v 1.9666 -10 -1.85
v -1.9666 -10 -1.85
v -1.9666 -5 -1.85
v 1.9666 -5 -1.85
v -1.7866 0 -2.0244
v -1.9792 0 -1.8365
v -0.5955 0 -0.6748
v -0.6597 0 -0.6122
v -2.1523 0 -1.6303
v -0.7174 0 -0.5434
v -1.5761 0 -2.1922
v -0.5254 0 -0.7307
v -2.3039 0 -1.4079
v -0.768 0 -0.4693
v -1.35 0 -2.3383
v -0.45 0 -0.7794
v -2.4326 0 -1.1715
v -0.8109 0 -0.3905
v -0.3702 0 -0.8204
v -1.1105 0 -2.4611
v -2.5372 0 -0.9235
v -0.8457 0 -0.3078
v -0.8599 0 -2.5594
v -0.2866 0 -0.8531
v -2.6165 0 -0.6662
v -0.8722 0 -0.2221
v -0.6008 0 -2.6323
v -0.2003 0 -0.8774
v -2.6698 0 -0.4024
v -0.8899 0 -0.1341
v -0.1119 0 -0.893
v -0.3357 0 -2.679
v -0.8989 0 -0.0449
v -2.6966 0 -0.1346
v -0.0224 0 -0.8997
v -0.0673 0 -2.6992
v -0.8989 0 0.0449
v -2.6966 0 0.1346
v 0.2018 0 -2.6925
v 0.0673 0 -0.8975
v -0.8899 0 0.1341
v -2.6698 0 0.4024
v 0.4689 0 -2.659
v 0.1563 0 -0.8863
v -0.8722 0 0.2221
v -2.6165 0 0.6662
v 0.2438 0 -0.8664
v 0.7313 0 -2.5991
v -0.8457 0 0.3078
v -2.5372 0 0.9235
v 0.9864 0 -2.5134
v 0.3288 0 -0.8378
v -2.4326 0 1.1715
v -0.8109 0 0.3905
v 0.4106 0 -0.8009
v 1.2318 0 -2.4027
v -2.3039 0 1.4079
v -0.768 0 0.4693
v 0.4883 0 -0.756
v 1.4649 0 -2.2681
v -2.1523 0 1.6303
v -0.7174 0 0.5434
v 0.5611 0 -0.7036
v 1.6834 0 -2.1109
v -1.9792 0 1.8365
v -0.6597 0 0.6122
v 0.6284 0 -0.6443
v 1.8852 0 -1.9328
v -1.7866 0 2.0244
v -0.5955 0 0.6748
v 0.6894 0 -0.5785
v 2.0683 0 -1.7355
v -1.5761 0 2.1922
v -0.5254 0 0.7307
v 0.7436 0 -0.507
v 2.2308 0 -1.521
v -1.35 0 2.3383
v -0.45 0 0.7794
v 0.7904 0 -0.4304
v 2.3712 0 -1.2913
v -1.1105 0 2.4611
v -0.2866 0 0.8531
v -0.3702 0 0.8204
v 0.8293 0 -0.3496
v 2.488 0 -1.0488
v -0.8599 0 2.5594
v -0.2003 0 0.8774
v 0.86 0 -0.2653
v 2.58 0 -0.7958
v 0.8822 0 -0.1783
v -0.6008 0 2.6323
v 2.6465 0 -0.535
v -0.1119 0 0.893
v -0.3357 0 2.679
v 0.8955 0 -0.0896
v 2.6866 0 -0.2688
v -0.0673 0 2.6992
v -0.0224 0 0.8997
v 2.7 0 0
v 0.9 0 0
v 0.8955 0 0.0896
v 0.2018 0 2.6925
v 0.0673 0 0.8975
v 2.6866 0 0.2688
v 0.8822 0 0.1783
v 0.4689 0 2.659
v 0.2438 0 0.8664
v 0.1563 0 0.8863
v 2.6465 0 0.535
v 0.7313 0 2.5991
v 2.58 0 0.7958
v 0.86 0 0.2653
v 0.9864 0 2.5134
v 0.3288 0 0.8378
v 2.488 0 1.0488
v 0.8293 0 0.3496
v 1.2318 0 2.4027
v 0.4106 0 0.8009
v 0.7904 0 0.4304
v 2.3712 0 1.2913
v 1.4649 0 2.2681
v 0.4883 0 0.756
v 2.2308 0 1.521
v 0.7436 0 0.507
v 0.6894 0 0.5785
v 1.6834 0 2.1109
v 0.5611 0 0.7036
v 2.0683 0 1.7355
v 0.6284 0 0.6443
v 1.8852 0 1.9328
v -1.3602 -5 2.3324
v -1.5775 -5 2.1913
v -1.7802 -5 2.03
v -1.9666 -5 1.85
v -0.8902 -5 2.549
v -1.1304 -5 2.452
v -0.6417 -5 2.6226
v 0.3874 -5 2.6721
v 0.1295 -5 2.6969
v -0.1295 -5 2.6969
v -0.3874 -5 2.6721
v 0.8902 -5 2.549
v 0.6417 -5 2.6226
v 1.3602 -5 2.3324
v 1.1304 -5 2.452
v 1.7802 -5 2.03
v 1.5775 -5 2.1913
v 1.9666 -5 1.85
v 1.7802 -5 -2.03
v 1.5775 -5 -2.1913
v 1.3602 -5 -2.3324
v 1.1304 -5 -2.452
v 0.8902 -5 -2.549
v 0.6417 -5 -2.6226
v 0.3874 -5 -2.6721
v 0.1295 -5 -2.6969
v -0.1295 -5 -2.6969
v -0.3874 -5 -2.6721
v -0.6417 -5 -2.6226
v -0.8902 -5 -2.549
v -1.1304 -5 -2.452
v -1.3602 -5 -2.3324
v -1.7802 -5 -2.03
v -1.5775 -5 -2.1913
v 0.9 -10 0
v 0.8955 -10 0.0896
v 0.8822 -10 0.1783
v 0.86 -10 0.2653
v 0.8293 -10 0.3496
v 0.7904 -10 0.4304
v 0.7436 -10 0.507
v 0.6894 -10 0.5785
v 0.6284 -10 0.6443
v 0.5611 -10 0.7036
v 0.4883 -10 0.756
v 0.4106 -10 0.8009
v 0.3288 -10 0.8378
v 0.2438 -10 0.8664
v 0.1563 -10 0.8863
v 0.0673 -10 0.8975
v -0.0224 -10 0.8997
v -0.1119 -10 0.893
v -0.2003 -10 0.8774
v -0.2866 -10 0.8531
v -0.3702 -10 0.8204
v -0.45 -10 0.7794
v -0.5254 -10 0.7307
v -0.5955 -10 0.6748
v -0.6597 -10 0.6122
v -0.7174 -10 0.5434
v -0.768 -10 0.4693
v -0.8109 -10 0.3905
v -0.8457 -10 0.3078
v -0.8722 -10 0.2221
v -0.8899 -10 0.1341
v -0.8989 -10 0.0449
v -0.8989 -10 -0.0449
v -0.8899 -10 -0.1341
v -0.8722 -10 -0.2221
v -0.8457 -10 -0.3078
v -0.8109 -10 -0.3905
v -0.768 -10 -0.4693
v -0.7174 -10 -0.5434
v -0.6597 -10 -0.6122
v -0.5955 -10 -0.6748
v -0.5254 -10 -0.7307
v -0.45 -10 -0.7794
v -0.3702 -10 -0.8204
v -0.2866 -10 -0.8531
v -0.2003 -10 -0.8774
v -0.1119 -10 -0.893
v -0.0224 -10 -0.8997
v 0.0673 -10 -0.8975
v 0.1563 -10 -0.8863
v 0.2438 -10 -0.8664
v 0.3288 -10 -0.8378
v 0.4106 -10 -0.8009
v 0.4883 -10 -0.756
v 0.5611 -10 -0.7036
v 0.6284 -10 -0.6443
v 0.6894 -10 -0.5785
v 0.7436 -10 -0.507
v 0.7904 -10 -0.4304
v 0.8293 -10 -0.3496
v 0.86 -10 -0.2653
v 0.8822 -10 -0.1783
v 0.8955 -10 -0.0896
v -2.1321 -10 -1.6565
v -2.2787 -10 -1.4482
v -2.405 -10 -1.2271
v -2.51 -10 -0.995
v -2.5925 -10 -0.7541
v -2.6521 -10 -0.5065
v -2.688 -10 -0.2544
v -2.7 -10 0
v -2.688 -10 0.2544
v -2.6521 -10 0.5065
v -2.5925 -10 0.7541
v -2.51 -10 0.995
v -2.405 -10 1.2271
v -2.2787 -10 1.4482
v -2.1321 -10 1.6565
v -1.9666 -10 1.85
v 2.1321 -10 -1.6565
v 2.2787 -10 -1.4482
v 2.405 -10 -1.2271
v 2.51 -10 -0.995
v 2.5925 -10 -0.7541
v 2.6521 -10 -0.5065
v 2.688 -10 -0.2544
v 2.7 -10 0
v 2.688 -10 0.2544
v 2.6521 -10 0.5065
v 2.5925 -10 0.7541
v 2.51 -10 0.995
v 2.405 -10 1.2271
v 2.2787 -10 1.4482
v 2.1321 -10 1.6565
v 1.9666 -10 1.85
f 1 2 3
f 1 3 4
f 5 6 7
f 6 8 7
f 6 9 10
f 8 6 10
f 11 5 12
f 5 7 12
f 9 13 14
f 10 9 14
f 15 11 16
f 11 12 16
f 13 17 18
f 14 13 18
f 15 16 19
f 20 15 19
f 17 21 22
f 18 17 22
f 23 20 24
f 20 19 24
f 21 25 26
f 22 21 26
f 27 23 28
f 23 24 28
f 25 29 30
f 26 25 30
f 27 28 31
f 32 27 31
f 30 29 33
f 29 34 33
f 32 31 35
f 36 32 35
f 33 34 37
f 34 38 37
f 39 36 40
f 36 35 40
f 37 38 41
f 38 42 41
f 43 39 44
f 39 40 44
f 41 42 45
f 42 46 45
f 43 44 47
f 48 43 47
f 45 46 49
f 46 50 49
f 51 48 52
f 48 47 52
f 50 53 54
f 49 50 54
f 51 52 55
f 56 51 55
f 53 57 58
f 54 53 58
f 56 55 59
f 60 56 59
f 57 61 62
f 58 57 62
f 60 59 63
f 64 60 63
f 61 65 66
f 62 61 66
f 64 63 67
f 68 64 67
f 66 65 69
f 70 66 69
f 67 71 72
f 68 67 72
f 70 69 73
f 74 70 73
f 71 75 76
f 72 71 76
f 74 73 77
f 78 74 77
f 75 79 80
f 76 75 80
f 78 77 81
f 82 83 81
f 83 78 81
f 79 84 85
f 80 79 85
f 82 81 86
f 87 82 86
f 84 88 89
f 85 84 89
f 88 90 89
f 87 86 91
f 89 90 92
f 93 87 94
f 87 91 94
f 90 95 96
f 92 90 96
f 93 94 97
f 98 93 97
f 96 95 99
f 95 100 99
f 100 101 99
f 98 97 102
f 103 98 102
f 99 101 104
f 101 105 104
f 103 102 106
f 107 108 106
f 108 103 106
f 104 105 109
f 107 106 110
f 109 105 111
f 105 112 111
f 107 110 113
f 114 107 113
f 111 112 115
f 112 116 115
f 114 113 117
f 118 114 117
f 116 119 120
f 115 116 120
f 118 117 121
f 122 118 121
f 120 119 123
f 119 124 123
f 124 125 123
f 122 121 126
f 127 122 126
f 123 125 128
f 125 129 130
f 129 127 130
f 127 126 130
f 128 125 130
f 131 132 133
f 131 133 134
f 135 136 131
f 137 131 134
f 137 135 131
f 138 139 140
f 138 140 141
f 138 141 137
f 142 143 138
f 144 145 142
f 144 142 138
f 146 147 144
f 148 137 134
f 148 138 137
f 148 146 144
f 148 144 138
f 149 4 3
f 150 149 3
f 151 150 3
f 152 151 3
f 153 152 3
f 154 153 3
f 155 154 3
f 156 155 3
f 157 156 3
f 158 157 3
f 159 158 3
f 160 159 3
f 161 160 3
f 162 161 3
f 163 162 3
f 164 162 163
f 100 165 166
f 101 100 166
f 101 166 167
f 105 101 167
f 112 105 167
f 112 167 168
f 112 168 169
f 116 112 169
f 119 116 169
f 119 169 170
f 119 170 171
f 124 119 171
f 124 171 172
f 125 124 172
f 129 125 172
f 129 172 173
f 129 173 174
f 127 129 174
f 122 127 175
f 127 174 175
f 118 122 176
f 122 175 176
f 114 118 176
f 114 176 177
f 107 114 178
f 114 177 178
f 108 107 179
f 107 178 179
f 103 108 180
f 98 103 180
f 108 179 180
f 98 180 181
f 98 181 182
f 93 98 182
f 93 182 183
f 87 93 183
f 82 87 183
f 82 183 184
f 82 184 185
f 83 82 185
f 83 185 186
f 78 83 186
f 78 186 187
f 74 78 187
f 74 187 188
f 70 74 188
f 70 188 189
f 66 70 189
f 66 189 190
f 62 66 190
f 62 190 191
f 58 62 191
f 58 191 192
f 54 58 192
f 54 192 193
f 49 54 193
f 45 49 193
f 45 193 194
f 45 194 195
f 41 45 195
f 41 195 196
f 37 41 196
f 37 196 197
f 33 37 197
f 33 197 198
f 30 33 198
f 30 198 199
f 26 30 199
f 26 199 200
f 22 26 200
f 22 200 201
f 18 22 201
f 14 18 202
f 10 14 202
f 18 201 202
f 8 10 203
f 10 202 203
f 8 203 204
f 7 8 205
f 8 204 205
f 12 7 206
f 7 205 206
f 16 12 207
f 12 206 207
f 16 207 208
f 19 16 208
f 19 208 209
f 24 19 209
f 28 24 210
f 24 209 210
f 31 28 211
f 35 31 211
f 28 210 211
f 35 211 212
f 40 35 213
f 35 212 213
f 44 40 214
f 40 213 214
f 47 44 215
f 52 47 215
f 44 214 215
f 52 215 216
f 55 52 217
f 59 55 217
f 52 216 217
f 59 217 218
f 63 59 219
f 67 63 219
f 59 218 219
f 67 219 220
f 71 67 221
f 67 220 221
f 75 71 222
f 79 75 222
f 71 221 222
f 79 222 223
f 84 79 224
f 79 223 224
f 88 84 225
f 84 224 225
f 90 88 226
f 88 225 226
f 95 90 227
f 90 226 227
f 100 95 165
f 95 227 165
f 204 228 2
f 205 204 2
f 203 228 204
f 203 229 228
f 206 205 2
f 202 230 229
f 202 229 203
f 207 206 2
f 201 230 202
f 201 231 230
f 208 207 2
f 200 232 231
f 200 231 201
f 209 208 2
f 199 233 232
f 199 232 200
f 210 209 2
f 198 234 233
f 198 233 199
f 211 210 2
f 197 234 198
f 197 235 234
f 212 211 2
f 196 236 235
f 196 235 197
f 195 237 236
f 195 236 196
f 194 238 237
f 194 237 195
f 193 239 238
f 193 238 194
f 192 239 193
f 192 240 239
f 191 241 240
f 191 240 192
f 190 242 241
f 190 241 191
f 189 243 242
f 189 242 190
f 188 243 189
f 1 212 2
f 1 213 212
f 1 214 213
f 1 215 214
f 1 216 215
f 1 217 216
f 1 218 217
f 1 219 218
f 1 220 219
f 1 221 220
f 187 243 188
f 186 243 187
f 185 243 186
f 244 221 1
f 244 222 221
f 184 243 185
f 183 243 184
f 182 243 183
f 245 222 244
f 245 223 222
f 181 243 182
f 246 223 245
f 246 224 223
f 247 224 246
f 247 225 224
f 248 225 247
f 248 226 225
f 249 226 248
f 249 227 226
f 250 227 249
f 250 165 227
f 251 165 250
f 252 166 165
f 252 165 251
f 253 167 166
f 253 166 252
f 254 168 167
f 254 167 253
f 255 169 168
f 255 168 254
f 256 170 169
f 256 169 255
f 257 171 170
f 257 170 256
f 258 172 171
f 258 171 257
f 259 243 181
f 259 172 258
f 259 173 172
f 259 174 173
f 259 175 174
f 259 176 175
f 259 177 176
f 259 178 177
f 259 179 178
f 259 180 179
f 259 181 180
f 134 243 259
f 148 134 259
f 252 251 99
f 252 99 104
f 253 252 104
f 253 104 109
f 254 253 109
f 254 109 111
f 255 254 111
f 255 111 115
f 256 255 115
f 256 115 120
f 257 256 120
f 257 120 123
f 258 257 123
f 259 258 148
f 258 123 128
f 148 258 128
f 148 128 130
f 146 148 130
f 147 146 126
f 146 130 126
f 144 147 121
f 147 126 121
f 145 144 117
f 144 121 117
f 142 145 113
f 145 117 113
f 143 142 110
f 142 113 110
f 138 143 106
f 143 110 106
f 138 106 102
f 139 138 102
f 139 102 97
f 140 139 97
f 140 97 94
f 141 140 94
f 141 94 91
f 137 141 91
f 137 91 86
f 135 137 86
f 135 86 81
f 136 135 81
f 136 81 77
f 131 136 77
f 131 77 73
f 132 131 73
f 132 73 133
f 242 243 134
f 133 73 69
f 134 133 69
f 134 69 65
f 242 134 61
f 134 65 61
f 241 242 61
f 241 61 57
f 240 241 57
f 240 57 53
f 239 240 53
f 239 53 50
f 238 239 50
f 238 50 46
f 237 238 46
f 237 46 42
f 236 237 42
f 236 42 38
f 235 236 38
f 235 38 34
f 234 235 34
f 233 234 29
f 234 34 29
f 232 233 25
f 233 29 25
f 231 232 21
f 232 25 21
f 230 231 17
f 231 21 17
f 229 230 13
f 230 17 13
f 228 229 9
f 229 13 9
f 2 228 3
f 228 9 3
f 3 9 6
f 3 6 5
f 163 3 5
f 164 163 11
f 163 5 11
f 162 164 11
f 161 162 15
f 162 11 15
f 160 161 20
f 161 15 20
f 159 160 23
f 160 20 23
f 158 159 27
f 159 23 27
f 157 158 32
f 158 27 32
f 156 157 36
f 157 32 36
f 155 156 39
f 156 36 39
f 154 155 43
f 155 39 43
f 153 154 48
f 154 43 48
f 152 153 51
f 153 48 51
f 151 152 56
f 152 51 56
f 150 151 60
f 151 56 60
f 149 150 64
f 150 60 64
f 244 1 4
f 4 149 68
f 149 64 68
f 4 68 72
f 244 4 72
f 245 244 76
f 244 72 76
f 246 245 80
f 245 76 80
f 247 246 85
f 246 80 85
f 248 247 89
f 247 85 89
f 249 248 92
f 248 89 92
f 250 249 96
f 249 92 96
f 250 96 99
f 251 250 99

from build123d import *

# Parameters (mm, degrees)
SKETCH_R        = 2.7
PAD_DEPTH       = 10
POCKET_DEPTH    = 5
SKETCH002_R     = 0.9
POCKET001_DEPTH = 10.001


with BuildPart() as part:
    # Sketch → Pad (new body)
    with BuildSketch(Plane.XZ):
        Circle(SKETCH_R)
    extrude(amount=PAD_DEPTH)

    # Sketch001 (on Face3 of Pad) → Pocket (cut)
    with BuildSketch(Plane.XZ.offset(10)):
        with BuildLine():
            Line((-1.966596, 1.85), (1.966596, 1.85))
            ThreePointArc((1.966596, 1.85), (0, 2.7), (-1.966596, 1.85))
        make_face()
        with BuildLine():
            Line((-1.966596, -1.85), (1.966596, -1.85))
            ThreePointArc((-1.966596, -1.85), (0, -2.7), (1.966596, -1.85))
        make_face()
    extrude(amount=-POCKET_DEPTH, mode=Mode.SUBTRACT)

    # Sketch002 (on Face3 of Pocket) → Pocket001 (cut, through all)
    with BuildSketch(Plane.XZ.offset(10)):
        Circle(SKETCH002_R)
    extrude(amount=-POCKET001_DEPTH, mode=Mode.SUBTRACT)


solid = part.part
